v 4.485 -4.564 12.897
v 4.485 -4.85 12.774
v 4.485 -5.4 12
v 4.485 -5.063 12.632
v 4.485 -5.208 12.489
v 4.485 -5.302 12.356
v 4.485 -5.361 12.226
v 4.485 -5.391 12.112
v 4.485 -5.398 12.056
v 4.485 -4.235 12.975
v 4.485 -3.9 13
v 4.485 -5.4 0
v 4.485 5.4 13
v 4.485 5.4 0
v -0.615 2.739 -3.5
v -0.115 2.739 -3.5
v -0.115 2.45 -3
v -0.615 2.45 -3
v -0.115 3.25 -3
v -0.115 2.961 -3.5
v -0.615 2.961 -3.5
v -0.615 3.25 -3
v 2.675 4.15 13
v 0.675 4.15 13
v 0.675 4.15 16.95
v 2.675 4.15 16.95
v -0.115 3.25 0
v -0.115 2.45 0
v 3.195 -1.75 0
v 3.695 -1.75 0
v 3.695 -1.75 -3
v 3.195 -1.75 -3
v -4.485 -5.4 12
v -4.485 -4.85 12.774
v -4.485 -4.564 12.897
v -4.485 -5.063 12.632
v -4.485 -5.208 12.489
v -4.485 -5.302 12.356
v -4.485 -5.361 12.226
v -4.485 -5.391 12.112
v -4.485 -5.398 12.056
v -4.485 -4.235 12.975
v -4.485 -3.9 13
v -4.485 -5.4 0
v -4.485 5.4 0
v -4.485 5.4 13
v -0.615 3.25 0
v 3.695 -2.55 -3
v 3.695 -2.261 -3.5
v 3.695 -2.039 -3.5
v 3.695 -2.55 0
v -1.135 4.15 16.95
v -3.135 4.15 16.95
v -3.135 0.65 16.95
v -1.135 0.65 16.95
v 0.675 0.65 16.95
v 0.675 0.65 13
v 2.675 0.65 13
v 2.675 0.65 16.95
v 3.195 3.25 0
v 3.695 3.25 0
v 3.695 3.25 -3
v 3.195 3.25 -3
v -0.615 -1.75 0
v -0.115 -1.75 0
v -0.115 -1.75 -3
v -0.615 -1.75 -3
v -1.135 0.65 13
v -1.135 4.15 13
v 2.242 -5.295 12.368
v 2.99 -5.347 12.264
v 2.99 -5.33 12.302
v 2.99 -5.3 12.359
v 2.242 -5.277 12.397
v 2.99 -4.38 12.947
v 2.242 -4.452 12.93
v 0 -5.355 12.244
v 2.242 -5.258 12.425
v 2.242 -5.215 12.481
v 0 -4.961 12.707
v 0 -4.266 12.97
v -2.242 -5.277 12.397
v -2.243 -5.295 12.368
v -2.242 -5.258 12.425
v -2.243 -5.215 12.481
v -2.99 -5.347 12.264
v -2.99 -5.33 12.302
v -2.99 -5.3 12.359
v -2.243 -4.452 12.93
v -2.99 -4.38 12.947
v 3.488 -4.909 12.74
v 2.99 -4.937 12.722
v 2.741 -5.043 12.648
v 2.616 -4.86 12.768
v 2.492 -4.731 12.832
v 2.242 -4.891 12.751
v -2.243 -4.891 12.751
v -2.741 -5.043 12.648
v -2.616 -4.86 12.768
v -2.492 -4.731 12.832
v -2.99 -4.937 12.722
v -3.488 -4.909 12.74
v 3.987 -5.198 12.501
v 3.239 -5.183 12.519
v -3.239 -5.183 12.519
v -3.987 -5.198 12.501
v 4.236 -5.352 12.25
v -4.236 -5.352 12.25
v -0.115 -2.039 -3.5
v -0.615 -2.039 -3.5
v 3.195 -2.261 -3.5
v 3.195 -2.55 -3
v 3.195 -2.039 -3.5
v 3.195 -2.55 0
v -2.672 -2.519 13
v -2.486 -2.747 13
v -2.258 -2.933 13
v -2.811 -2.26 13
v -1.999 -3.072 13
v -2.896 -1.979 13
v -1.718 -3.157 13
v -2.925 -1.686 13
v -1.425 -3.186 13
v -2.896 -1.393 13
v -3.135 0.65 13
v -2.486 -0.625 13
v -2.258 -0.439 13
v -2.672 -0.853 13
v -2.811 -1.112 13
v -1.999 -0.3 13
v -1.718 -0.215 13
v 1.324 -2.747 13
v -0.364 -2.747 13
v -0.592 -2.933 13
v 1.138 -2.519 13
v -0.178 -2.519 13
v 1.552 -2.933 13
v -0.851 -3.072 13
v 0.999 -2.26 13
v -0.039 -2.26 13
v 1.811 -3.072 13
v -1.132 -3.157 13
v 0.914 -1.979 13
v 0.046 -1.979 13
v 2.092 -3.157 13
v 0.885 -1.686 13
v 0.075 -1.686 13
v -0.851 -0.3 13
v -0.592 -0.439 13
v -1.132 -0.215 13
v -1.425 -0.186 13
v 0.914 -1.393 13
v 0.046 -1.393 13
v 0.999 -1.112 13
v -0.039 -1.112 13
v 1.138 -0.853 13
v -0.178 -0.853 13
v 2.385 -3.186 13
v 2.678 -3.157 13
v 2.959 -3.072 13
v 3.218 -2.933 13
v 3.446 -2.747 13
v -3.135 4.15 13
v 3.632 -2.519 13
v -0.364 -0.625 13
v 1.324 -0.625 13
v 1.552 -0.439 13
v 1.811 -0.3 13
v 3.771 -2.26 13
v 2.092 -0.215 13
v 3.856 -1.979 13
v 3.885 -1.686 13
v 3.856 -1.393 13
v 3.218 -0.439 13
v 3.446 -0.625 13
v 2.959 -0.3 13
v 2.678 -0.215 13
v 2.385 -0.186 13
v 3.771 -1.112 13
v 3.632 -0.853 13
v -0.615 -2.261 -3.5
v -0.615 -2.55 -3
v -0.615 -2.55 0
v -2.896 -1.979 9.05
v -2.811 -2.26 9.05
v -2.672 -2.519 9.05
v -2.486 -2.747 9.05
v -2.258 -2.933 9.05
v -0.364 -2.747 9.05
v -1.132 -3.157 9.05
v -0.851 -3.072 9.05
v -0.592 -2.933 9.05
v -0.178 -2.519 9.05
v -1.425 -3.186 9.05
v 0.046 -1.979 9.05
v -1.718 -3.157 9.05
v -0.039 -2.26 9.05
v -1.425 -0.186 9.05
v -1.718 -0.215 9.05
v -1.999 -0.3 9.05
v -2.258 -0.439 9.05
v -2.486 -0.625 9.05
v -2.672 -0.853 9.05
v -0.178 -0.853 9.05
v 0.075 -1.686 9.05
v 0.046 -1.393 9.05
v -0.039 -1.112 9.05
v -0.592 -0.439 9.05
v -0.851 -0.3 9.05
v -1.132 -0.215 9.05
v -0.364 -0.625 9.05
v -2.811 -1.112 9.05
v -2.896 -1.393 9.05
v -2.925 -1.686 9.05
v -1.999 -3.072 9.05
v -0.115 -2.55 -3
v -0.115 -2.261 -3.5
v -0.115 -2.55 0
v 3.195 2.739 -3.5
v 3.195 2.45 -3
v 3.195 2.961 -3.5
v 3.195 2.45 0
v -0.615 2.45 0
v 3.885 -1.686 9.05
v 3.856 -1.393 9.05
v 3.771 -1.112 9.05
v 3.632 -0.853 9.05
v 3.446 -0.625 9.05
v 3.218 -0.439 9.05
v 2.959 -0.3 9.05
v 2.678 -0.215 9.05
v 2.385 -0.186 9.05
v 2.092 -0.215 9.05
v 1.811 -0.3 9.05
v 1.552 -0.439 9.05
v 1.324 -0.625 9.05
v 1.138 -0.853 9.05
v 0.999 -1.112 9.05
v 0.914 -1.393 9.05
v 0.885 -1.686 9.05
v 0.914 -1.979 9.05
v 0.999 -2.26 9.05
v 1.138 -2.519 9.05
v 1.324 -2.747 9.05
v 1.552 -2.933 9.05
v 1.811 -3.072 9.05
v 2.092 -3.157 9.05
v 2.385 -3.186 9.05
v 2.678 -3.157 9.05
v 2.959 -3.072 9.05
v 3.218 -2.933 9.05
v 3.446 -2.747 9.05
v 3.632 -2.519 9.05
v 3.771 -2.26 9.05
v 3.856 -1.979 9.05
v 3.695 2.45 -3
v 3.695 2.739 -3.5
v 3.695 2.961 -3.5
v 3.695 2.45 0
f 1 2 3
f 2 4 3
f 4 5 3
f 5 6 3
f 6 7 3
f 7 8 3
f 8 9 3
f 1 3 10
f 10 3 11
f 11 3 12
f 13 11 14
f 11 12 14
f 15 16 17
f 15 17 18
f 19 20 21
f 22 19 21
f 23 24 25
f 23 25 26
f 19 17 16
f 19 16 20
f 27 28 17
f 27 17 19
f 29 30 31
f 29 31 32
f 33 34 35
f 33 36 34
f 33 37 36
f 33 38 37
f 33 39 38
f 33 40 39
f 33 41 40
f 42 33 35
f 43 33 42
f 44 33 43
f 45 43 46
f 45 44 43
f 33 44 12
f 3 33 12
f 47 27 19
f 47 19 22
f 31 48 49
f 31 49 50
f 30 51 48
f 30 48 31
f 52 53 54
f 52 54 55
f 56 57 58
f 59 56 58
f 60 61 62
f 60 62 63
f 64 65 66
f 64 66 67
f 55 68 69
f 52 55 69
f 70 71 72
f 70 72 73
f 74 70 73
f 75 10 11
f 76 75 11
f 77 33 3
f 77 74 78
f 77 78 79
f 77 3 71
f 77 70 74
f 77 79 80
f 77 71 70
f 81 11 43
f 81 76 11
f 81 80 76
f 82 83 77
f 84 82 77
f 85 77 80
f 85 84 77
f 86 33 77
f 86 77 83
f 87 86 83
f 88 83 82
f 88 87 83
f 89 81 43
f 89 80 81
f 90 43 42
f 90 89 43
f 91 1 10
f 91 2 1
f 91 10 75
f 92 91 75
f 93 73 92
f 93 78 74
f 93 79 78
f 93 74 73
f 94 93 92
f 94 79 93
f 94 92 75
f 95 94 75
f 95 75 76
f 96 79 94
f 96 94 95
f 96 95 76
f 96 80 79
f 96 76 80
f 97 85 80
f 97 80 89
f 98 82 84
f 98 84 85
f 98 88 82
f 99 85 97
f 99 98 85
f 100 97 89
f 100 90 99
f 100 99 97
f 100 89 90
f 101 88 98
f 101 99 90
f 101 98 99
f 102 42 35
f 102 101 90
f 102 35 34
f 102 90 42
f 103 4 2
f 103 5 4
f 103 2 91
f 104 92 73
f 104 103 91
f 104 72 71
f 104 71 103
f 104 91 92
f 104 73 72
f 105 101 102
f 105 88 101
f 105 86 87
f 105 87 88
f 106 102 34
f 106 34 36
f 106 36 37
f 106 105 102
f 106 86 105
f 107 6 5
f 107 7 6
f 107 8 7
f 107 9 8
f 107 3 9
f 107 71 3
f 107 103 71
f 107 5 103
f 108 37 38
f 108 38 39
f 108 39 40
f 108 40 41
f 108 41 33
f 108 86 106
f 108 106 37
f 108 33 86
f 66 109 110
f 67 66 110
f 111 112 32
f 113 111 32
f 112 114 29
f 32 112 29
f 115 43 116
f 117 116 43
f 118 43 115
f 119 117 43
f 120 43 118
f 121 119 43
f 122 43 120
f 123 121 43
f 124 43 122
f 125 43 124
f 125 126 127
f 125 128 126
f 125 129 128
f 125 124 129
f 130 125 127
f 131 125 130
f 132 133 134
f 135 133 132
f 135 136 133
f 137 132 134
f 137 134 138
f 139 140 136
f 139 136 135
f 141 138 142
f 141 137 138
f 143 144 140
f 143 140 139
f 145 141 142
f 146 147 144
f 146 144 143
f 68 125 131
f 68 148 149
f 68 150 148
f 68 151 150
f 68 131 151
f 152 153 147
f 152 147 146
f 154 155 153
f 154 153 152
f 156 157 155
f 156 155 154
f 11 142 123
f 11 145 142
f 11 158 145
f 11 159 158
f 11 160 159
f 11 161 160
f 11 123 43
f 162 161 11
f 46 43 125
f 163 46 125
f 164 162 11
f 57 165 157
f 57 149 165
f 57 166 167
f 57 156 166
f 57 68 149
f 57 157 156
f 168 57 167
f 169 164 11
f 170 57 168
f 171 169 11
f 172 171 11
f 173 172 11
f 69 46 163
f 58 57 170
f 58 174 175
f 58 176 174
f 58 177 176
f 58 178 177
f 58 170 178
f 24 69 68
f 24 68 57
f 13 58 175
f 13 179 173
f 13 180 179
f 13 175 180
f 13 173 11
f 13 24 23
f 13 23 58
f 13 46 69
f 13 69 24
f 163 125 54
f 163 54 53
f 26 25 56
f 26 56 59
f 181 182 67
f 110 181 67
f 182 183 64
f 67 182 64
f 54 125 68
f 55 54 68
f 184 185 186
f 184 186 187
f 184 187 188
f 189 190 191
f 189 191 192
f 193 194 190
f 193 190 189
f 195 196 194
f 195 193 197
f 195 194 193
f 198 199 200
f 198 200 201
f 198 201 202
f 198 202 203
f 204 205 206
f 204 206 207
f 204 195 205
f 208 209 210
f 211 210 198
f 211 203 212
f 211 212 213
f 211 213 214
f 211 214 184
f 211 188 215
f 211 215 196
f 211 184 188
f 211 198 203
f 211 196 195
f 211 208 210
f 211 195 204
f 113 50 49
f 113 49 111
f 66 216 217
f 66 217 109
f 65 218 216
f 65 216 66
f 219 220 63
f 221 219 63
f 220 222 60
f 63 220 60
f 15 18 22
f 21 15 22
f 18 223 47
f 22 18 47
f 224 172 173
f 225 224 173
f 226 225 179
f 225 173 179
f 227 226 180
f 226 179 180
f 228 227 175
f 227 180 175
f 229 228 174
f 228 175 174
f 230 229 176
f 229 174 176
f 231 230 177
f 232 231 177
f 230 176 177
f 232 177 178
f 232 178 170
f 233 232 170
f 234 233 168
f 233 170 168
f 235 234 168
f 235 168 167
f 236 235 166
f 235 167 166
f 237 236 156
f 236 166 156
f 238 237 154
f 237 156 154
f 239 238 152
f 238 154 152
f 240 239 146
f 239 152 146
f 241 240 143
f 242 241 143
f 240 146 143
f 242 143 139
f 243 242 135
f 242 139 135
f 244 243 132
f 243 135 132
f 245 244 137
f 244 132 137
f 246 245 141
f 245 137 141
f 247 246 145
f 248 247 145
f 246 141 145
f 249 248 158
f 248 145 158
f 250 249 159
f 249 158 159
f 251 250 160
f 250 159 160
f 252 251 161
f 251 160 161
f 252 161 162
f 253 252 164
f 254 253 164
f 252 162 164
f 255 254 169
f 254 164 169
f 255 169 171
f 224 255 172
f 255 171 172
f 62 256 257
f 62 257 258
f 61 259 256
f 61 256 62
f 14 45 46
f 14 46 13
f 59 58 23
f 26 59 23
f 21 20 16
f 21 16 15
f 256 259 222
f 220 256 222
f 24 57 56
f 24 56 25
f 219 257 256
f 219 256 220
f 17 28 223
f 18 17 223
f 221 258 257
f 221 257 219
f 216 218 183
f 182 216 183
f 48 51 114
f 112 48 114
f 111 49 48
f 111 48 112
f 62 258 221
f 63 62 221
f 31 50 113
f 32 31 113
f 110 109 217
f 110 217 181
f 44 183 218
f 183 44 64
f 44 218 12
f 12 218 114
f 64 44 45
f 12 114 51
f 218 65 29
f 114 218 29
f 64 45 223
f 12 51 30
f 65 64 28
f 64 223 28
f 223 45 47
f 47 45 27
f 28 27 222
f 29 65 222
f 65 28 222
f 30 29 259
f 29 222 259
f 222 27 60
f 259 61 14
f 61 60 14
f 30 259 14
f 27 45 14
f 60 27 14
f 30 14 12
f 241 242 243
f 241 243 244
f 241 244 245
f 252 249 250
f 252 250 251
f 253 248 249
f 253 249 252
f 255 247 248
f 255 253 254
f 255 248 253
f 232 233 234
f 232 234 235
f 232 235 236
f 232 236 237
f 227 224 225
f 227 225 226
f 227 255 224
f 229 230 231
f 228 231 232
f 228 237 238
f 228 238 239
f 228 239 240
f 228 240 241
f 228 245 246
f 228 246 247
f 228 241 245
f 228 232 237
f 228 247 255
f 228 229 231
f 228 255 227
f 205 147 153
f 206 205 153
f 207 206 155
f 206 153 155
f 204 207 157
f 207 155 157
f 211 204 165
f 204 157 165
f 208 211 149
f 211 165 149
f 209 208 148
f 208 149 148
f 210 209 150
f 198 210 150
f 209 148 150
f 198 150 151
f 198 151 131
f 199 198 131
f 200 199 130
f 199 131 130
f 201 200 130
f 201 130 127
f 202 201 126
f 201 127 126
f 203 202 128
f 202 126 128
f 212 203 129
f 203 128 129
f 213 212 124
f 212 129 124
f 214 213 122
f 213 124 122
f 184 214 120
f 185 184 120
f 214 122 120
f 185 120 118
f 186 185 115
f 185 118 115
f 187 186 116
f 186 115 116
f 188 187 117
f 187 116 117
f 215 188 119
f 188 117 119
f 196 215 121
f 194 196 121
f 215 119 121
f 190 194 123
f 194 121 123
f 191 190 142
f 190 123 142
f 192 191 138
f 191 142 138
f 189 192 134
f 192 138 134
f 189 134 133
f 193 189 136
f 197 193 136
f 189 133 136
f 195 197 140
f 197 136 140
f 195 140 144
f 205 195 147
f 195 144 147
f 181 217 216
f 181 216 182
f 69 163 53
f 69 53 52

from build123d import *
from OCP.BRepFilletAPI import BRepFilletAPI_MakeChamfer

# Parameters (mm, degrees)
SKETCH_1_W                          = 8.97
SKETCH_1_H                          = 10.8
EXTRUDE_1_DEPTH                     = 13
FILLET_1_SIZE                       = 1
FILLET_1_SIZE_2                     = 1.5
SKETCH_2_W                          = 2
SKETCH_2_H                          = 3.5
EXTRUDE_2_DEPTH                     = 3.95
SKETCH_3_R                          = 1.5
CUT_EXTRUDE_1_DEPTH                 = 3.95
SKETCH_4_W                          = 0.5
SKETCH_4_H                          = 0.8
EXTRUDE_3_DEPTH                     = 3.5
CHAMFER_1_SIZE                      = 0.5
CHAMFER_1_SIZE2                     = 0.288675135
PATTERN_LINEAR_2_COUNT              = 2
PATTERN_LINEAR_2_PITCH              = 3.81
CHAMFER_1_OF_PATTERN_LINEAR_2_SIZE  = 0.5
CHAMFER_1_OF_PATTERN_LINEAR_2_SIZE2 = 0.288675135


with BuildPart() as part:
    # Эскиз1 → Бобышка-Вытянуть1 (new body)
    with BuildSketch(Plane.XY):
        Rectangle(SKETCH_1_W, SKETCH_1_H)
    extrude(amount=EXTRUDE_1_DEPTH)

    # Скругление1
    # an asymmetric fillet: 1.5, 1 mm, written as the material it takes off along each edge
    with BuildSketch(Plane(origin=(-8.235, -5.4, 13), x_dir=(0, 0, -1), z_dir=(1, 0, 0))) as fillet_1_piece_1:
        with BuildLine():
            Bezier((FILLET_1_SIZE, 0), (0, 0), (0, FILLET_1_SIZE_2), weights=[1, 0.707106781, 1])
            Line((0, FILLET_1_SIZE_2), (0, 0))
            Line((0, 0), (FILLET_1_SIZE, 0))
        make_face()
    extrude(amount=16.47, mode=Mode.SUBTRACT)

    # Эскиз2 → Бобышка-Вытянуть2 (add)
    with BuildSketch(Plane.XY.offset(13)):
        with Locations((1.675, 2.4)):
            Rectangle(SKETCH_2_W, SKETCH_2_H)
    extrude_2 = extrude(amount=EXTRUDE_2_DEPTH)

    # Эскиз3 → Вырез-Вытянуть1 (cut)
    with BuildSketch(Plane.XY.offset(13)):
        with Locations((2.385, -1.686021073)):
            Circle(SKETCH_3_R)
    cut_extrude_1 = extrude(amount=-CUT_EXTRUDE_1_DEPTH, mode=Mode.SUBTRACT)

    # Эскиз4 → Бобышка-Вытянуть3 (add)
    with BuildSketch(Plane(origin=(0, 0, 0), x_dir=(-1, 0, 0), z_dir=(0, 0, -1))):
        with Locations((-3.445, 2.85)):
            Rectangle(SKETCH_4_W, SKETCH_4_H)
        with Locations((-3.445, -2.15)):
            Rectangle(SKETCH_4_W, SKETCH_4_H)
    extrude_3 = extrude(amount=EXTRUDE_3_DEPTH)

    # Фаска1: one chamfer whose edges measure the first distance from different faces: ONE call of the kernel's chamfer builder (chamfer() names one face for all edges)
    chamfer_1_edges_1 = [part.edges().sort_by_distance(p)[0] for p in [
        (3.445, 3.25, -3.5),
    ]]
    chamfer_1_side_1 = [part.faces().sort_by_distance(p)[0] for p in [
        (3.445, 3.25, -1.75),
    ]]
    chamfer_1_edges_2 = [part.edges().sort_by_distance(p)[0] for p in [
        (3.445, 2.45, -3.5),
    ]]
    chamfer_1_side_2 = [part.faces().sort_by_distance(p)[0] for p in [
        (3.445, 2.45, -1.75),
    ]]
    chamfer_1_edges_3 = [part.edges().sort_by_distance(p)[0] for p in [
        (3.445, -2.55, -3.5),
    ]]
    chamfer_1_side_3 = [part.faces().sort_by_distance(p)[0] for p in [
        (3.445, -2.55, -1.75),
    ]]
    chamfer_1_edges_4 = [part.edges().sort_by_distance(p)[0] for p in [
        (3.445, -1.75, -3.5),
    ]]
    chamfer_1_side_4 = [part.faces().sort_by_distance(p)[0] for p in [
        (3.445, -1.75, -1.75),
    ]]
    chamfer_1 = BRepFilletAPI_MakeChamfer(part.part.solid().wrapped)
    for e in chamfer_1_edges_1:
        chamfer_1.Add(CHAMFER_1_SIZE, CHAMFER_1_SIZE2, e.wrapped, chamfer_1_side_1[0].wrapped)  # the first distance lies on this face
    for e in chamfer_1_edges_2:
        chamfer_1.Add(CHAMFER_1_SIZE, CHAMFER_1_SIZE2, e.wrapped, chamfer_1_side_2[0].wrapped)  # the first distance lies on this face
    for e in chamfer_1_edges_3:
        chamfer_1.Add(CHAMFER_1_SIZE, CHAMFER_1_SIZE2, e.wrapped, chamfer_1_side_3[0].wrapped)  # the first distance lies on this face
    for e in chamfer_1_edges_4:
        chamfer_1.Add(CHAMFER_1_SIZE, CHAMFER_1_SIZE2, e.wrapped, chamfer_1_side_4[0].wrapped)  # the first distance lies on this face
    add(Compound.cast(chamfer_1.Shape()), mode=Mode.REPLACE)

    # Линейный массив2: Бобышка-Вытянуть2, Вырез-Вытянуть1, Бобышка-Вытянуть3 ×2
    with Locations(*[(-i * PATTERN_LINEAR_2_PITCH, 0, 0) for i in range(1, PATTERN_LINEAR_2_COUNT)]):
        add(extrude_2)
        add(cut_extrude_1, mode=Mode.SUBTRACT)
        add(extrude_3)

    # Фаска1 of Линейный массив2: one chamfer whose edges measure the first distance from different faces: ONE call of the kernel's chamfer builder (chamfer() names one face for all edges)
    chamfer_1_of_pattern_linear_2_edges_1 = [part.edges().sort_by_distance(p)[0] for p in [
        (-0.365, 3.25, -3.5),
    ]]
    chamfer_1_of_pattern_linear_2_side_1 = [part.faces().sort_by_distance(p)[0] for p in [
        (-0.365, 3.25, -1.75),
    ]]
    chamfer_1_of_pattern_linear_2_edges_2 = [part.edges().sort_by_distance(p)[0] for p in [
        (-0.365, 2.45, -3.5),
    ]]
    chamfer_1_of_pattern_linear_2_side_2 = [part.faces().sort_by_distance(p)[0] for p in [
        (-0.365, 2.45, -1.75),
    ]]
    chamfer_1_of_pattern_linear_2_edges_3 = [part.edges().sort_by_distance(p)[0] for p in [
        (-0.365, -2.55, -3.5),
    ]]
    chamfer_1_of_pattern_linear_2_side_3 = [part.faces().sort_by_distance(p)[0] for p in [
        (-0.365, -2.55, -1.75),
    ]]
    chamfer_1_of_pattern_linear_2_edges_4 = [part.edges().sort_by_distance(p)[0] for p in [
        (-0.365, -1.75, -3.5),
    ]]
    chamfer_1_of_pattern_linear_2_side_4 = [part.faces().sort_by_distance(p)[0] for p in [
        (-0.365, -1.75, -1.75),
    ]]
    chamfer_1_of_pattern_linear_2 = BRepFilletAPI_MakeChamfer(part.part.solid().wrapped)
    for e in chamfer_1_of_pattern_linear_2_edges_1:
        chamfer_1_of_pattern_linear_2.Add(CHAMFER_1_OF_PATTERN_LINEAR_2_SIZE, CHAMFER_1_OF_PATTERN_LINEAR_2_SIZE2, e.wrapped, chamfer_1_of_pattern_linear_2_side_1[0].wrapped)  # the first distance lies on this face
    for e in chamfer_1_of_pattern_linear_2_edges_2:
        chamfer_1_of_pattern_linear_2.Add(CHAMFER_1_OF_PATTERN_LINEAR_2_SIZE, CHAMFER_1_OF_PATTERN_LINEAR_2_SIZE2, e.wrapped, chamfer_1_of_pattern_linear_2_side_2[0].wrapped)  # the first distance lies on this face
    for e in chamfer_1_of_pattern_linear_2_edges_3:
        chamfer_1_of_pattern_linear_2.Add(CHAMFER_1_OF_PATTERN_LINEAR_2_SIZE, CHAMFER_1_OF_PATTERN_LINEAR_2_SIZE2, e.wrapped, chamfer_1_of_pattern_linear_2_side_3[0].wrapped)  # the first distance lies on this face
    for e in chamfer_1_of_pattern_linear_2_edges_4:
        chamfer_1_of_pattern_linear_2.Add(CHAMFER_1_OF_PATTERN_LINEAR_2_SIZE, CHAMFER_1_OF_PATTERN_LINEAR_2_SIZE2, e.wrapped, chamfer_1_of_pattern_linear_2_side_4[0].wrapped)  # the first distance lies on this face
    add(Compound.cast(chamfer_1_of_pattern_linear_2.Shape()), mode=Mode.REPLACE)


solid = part.part
